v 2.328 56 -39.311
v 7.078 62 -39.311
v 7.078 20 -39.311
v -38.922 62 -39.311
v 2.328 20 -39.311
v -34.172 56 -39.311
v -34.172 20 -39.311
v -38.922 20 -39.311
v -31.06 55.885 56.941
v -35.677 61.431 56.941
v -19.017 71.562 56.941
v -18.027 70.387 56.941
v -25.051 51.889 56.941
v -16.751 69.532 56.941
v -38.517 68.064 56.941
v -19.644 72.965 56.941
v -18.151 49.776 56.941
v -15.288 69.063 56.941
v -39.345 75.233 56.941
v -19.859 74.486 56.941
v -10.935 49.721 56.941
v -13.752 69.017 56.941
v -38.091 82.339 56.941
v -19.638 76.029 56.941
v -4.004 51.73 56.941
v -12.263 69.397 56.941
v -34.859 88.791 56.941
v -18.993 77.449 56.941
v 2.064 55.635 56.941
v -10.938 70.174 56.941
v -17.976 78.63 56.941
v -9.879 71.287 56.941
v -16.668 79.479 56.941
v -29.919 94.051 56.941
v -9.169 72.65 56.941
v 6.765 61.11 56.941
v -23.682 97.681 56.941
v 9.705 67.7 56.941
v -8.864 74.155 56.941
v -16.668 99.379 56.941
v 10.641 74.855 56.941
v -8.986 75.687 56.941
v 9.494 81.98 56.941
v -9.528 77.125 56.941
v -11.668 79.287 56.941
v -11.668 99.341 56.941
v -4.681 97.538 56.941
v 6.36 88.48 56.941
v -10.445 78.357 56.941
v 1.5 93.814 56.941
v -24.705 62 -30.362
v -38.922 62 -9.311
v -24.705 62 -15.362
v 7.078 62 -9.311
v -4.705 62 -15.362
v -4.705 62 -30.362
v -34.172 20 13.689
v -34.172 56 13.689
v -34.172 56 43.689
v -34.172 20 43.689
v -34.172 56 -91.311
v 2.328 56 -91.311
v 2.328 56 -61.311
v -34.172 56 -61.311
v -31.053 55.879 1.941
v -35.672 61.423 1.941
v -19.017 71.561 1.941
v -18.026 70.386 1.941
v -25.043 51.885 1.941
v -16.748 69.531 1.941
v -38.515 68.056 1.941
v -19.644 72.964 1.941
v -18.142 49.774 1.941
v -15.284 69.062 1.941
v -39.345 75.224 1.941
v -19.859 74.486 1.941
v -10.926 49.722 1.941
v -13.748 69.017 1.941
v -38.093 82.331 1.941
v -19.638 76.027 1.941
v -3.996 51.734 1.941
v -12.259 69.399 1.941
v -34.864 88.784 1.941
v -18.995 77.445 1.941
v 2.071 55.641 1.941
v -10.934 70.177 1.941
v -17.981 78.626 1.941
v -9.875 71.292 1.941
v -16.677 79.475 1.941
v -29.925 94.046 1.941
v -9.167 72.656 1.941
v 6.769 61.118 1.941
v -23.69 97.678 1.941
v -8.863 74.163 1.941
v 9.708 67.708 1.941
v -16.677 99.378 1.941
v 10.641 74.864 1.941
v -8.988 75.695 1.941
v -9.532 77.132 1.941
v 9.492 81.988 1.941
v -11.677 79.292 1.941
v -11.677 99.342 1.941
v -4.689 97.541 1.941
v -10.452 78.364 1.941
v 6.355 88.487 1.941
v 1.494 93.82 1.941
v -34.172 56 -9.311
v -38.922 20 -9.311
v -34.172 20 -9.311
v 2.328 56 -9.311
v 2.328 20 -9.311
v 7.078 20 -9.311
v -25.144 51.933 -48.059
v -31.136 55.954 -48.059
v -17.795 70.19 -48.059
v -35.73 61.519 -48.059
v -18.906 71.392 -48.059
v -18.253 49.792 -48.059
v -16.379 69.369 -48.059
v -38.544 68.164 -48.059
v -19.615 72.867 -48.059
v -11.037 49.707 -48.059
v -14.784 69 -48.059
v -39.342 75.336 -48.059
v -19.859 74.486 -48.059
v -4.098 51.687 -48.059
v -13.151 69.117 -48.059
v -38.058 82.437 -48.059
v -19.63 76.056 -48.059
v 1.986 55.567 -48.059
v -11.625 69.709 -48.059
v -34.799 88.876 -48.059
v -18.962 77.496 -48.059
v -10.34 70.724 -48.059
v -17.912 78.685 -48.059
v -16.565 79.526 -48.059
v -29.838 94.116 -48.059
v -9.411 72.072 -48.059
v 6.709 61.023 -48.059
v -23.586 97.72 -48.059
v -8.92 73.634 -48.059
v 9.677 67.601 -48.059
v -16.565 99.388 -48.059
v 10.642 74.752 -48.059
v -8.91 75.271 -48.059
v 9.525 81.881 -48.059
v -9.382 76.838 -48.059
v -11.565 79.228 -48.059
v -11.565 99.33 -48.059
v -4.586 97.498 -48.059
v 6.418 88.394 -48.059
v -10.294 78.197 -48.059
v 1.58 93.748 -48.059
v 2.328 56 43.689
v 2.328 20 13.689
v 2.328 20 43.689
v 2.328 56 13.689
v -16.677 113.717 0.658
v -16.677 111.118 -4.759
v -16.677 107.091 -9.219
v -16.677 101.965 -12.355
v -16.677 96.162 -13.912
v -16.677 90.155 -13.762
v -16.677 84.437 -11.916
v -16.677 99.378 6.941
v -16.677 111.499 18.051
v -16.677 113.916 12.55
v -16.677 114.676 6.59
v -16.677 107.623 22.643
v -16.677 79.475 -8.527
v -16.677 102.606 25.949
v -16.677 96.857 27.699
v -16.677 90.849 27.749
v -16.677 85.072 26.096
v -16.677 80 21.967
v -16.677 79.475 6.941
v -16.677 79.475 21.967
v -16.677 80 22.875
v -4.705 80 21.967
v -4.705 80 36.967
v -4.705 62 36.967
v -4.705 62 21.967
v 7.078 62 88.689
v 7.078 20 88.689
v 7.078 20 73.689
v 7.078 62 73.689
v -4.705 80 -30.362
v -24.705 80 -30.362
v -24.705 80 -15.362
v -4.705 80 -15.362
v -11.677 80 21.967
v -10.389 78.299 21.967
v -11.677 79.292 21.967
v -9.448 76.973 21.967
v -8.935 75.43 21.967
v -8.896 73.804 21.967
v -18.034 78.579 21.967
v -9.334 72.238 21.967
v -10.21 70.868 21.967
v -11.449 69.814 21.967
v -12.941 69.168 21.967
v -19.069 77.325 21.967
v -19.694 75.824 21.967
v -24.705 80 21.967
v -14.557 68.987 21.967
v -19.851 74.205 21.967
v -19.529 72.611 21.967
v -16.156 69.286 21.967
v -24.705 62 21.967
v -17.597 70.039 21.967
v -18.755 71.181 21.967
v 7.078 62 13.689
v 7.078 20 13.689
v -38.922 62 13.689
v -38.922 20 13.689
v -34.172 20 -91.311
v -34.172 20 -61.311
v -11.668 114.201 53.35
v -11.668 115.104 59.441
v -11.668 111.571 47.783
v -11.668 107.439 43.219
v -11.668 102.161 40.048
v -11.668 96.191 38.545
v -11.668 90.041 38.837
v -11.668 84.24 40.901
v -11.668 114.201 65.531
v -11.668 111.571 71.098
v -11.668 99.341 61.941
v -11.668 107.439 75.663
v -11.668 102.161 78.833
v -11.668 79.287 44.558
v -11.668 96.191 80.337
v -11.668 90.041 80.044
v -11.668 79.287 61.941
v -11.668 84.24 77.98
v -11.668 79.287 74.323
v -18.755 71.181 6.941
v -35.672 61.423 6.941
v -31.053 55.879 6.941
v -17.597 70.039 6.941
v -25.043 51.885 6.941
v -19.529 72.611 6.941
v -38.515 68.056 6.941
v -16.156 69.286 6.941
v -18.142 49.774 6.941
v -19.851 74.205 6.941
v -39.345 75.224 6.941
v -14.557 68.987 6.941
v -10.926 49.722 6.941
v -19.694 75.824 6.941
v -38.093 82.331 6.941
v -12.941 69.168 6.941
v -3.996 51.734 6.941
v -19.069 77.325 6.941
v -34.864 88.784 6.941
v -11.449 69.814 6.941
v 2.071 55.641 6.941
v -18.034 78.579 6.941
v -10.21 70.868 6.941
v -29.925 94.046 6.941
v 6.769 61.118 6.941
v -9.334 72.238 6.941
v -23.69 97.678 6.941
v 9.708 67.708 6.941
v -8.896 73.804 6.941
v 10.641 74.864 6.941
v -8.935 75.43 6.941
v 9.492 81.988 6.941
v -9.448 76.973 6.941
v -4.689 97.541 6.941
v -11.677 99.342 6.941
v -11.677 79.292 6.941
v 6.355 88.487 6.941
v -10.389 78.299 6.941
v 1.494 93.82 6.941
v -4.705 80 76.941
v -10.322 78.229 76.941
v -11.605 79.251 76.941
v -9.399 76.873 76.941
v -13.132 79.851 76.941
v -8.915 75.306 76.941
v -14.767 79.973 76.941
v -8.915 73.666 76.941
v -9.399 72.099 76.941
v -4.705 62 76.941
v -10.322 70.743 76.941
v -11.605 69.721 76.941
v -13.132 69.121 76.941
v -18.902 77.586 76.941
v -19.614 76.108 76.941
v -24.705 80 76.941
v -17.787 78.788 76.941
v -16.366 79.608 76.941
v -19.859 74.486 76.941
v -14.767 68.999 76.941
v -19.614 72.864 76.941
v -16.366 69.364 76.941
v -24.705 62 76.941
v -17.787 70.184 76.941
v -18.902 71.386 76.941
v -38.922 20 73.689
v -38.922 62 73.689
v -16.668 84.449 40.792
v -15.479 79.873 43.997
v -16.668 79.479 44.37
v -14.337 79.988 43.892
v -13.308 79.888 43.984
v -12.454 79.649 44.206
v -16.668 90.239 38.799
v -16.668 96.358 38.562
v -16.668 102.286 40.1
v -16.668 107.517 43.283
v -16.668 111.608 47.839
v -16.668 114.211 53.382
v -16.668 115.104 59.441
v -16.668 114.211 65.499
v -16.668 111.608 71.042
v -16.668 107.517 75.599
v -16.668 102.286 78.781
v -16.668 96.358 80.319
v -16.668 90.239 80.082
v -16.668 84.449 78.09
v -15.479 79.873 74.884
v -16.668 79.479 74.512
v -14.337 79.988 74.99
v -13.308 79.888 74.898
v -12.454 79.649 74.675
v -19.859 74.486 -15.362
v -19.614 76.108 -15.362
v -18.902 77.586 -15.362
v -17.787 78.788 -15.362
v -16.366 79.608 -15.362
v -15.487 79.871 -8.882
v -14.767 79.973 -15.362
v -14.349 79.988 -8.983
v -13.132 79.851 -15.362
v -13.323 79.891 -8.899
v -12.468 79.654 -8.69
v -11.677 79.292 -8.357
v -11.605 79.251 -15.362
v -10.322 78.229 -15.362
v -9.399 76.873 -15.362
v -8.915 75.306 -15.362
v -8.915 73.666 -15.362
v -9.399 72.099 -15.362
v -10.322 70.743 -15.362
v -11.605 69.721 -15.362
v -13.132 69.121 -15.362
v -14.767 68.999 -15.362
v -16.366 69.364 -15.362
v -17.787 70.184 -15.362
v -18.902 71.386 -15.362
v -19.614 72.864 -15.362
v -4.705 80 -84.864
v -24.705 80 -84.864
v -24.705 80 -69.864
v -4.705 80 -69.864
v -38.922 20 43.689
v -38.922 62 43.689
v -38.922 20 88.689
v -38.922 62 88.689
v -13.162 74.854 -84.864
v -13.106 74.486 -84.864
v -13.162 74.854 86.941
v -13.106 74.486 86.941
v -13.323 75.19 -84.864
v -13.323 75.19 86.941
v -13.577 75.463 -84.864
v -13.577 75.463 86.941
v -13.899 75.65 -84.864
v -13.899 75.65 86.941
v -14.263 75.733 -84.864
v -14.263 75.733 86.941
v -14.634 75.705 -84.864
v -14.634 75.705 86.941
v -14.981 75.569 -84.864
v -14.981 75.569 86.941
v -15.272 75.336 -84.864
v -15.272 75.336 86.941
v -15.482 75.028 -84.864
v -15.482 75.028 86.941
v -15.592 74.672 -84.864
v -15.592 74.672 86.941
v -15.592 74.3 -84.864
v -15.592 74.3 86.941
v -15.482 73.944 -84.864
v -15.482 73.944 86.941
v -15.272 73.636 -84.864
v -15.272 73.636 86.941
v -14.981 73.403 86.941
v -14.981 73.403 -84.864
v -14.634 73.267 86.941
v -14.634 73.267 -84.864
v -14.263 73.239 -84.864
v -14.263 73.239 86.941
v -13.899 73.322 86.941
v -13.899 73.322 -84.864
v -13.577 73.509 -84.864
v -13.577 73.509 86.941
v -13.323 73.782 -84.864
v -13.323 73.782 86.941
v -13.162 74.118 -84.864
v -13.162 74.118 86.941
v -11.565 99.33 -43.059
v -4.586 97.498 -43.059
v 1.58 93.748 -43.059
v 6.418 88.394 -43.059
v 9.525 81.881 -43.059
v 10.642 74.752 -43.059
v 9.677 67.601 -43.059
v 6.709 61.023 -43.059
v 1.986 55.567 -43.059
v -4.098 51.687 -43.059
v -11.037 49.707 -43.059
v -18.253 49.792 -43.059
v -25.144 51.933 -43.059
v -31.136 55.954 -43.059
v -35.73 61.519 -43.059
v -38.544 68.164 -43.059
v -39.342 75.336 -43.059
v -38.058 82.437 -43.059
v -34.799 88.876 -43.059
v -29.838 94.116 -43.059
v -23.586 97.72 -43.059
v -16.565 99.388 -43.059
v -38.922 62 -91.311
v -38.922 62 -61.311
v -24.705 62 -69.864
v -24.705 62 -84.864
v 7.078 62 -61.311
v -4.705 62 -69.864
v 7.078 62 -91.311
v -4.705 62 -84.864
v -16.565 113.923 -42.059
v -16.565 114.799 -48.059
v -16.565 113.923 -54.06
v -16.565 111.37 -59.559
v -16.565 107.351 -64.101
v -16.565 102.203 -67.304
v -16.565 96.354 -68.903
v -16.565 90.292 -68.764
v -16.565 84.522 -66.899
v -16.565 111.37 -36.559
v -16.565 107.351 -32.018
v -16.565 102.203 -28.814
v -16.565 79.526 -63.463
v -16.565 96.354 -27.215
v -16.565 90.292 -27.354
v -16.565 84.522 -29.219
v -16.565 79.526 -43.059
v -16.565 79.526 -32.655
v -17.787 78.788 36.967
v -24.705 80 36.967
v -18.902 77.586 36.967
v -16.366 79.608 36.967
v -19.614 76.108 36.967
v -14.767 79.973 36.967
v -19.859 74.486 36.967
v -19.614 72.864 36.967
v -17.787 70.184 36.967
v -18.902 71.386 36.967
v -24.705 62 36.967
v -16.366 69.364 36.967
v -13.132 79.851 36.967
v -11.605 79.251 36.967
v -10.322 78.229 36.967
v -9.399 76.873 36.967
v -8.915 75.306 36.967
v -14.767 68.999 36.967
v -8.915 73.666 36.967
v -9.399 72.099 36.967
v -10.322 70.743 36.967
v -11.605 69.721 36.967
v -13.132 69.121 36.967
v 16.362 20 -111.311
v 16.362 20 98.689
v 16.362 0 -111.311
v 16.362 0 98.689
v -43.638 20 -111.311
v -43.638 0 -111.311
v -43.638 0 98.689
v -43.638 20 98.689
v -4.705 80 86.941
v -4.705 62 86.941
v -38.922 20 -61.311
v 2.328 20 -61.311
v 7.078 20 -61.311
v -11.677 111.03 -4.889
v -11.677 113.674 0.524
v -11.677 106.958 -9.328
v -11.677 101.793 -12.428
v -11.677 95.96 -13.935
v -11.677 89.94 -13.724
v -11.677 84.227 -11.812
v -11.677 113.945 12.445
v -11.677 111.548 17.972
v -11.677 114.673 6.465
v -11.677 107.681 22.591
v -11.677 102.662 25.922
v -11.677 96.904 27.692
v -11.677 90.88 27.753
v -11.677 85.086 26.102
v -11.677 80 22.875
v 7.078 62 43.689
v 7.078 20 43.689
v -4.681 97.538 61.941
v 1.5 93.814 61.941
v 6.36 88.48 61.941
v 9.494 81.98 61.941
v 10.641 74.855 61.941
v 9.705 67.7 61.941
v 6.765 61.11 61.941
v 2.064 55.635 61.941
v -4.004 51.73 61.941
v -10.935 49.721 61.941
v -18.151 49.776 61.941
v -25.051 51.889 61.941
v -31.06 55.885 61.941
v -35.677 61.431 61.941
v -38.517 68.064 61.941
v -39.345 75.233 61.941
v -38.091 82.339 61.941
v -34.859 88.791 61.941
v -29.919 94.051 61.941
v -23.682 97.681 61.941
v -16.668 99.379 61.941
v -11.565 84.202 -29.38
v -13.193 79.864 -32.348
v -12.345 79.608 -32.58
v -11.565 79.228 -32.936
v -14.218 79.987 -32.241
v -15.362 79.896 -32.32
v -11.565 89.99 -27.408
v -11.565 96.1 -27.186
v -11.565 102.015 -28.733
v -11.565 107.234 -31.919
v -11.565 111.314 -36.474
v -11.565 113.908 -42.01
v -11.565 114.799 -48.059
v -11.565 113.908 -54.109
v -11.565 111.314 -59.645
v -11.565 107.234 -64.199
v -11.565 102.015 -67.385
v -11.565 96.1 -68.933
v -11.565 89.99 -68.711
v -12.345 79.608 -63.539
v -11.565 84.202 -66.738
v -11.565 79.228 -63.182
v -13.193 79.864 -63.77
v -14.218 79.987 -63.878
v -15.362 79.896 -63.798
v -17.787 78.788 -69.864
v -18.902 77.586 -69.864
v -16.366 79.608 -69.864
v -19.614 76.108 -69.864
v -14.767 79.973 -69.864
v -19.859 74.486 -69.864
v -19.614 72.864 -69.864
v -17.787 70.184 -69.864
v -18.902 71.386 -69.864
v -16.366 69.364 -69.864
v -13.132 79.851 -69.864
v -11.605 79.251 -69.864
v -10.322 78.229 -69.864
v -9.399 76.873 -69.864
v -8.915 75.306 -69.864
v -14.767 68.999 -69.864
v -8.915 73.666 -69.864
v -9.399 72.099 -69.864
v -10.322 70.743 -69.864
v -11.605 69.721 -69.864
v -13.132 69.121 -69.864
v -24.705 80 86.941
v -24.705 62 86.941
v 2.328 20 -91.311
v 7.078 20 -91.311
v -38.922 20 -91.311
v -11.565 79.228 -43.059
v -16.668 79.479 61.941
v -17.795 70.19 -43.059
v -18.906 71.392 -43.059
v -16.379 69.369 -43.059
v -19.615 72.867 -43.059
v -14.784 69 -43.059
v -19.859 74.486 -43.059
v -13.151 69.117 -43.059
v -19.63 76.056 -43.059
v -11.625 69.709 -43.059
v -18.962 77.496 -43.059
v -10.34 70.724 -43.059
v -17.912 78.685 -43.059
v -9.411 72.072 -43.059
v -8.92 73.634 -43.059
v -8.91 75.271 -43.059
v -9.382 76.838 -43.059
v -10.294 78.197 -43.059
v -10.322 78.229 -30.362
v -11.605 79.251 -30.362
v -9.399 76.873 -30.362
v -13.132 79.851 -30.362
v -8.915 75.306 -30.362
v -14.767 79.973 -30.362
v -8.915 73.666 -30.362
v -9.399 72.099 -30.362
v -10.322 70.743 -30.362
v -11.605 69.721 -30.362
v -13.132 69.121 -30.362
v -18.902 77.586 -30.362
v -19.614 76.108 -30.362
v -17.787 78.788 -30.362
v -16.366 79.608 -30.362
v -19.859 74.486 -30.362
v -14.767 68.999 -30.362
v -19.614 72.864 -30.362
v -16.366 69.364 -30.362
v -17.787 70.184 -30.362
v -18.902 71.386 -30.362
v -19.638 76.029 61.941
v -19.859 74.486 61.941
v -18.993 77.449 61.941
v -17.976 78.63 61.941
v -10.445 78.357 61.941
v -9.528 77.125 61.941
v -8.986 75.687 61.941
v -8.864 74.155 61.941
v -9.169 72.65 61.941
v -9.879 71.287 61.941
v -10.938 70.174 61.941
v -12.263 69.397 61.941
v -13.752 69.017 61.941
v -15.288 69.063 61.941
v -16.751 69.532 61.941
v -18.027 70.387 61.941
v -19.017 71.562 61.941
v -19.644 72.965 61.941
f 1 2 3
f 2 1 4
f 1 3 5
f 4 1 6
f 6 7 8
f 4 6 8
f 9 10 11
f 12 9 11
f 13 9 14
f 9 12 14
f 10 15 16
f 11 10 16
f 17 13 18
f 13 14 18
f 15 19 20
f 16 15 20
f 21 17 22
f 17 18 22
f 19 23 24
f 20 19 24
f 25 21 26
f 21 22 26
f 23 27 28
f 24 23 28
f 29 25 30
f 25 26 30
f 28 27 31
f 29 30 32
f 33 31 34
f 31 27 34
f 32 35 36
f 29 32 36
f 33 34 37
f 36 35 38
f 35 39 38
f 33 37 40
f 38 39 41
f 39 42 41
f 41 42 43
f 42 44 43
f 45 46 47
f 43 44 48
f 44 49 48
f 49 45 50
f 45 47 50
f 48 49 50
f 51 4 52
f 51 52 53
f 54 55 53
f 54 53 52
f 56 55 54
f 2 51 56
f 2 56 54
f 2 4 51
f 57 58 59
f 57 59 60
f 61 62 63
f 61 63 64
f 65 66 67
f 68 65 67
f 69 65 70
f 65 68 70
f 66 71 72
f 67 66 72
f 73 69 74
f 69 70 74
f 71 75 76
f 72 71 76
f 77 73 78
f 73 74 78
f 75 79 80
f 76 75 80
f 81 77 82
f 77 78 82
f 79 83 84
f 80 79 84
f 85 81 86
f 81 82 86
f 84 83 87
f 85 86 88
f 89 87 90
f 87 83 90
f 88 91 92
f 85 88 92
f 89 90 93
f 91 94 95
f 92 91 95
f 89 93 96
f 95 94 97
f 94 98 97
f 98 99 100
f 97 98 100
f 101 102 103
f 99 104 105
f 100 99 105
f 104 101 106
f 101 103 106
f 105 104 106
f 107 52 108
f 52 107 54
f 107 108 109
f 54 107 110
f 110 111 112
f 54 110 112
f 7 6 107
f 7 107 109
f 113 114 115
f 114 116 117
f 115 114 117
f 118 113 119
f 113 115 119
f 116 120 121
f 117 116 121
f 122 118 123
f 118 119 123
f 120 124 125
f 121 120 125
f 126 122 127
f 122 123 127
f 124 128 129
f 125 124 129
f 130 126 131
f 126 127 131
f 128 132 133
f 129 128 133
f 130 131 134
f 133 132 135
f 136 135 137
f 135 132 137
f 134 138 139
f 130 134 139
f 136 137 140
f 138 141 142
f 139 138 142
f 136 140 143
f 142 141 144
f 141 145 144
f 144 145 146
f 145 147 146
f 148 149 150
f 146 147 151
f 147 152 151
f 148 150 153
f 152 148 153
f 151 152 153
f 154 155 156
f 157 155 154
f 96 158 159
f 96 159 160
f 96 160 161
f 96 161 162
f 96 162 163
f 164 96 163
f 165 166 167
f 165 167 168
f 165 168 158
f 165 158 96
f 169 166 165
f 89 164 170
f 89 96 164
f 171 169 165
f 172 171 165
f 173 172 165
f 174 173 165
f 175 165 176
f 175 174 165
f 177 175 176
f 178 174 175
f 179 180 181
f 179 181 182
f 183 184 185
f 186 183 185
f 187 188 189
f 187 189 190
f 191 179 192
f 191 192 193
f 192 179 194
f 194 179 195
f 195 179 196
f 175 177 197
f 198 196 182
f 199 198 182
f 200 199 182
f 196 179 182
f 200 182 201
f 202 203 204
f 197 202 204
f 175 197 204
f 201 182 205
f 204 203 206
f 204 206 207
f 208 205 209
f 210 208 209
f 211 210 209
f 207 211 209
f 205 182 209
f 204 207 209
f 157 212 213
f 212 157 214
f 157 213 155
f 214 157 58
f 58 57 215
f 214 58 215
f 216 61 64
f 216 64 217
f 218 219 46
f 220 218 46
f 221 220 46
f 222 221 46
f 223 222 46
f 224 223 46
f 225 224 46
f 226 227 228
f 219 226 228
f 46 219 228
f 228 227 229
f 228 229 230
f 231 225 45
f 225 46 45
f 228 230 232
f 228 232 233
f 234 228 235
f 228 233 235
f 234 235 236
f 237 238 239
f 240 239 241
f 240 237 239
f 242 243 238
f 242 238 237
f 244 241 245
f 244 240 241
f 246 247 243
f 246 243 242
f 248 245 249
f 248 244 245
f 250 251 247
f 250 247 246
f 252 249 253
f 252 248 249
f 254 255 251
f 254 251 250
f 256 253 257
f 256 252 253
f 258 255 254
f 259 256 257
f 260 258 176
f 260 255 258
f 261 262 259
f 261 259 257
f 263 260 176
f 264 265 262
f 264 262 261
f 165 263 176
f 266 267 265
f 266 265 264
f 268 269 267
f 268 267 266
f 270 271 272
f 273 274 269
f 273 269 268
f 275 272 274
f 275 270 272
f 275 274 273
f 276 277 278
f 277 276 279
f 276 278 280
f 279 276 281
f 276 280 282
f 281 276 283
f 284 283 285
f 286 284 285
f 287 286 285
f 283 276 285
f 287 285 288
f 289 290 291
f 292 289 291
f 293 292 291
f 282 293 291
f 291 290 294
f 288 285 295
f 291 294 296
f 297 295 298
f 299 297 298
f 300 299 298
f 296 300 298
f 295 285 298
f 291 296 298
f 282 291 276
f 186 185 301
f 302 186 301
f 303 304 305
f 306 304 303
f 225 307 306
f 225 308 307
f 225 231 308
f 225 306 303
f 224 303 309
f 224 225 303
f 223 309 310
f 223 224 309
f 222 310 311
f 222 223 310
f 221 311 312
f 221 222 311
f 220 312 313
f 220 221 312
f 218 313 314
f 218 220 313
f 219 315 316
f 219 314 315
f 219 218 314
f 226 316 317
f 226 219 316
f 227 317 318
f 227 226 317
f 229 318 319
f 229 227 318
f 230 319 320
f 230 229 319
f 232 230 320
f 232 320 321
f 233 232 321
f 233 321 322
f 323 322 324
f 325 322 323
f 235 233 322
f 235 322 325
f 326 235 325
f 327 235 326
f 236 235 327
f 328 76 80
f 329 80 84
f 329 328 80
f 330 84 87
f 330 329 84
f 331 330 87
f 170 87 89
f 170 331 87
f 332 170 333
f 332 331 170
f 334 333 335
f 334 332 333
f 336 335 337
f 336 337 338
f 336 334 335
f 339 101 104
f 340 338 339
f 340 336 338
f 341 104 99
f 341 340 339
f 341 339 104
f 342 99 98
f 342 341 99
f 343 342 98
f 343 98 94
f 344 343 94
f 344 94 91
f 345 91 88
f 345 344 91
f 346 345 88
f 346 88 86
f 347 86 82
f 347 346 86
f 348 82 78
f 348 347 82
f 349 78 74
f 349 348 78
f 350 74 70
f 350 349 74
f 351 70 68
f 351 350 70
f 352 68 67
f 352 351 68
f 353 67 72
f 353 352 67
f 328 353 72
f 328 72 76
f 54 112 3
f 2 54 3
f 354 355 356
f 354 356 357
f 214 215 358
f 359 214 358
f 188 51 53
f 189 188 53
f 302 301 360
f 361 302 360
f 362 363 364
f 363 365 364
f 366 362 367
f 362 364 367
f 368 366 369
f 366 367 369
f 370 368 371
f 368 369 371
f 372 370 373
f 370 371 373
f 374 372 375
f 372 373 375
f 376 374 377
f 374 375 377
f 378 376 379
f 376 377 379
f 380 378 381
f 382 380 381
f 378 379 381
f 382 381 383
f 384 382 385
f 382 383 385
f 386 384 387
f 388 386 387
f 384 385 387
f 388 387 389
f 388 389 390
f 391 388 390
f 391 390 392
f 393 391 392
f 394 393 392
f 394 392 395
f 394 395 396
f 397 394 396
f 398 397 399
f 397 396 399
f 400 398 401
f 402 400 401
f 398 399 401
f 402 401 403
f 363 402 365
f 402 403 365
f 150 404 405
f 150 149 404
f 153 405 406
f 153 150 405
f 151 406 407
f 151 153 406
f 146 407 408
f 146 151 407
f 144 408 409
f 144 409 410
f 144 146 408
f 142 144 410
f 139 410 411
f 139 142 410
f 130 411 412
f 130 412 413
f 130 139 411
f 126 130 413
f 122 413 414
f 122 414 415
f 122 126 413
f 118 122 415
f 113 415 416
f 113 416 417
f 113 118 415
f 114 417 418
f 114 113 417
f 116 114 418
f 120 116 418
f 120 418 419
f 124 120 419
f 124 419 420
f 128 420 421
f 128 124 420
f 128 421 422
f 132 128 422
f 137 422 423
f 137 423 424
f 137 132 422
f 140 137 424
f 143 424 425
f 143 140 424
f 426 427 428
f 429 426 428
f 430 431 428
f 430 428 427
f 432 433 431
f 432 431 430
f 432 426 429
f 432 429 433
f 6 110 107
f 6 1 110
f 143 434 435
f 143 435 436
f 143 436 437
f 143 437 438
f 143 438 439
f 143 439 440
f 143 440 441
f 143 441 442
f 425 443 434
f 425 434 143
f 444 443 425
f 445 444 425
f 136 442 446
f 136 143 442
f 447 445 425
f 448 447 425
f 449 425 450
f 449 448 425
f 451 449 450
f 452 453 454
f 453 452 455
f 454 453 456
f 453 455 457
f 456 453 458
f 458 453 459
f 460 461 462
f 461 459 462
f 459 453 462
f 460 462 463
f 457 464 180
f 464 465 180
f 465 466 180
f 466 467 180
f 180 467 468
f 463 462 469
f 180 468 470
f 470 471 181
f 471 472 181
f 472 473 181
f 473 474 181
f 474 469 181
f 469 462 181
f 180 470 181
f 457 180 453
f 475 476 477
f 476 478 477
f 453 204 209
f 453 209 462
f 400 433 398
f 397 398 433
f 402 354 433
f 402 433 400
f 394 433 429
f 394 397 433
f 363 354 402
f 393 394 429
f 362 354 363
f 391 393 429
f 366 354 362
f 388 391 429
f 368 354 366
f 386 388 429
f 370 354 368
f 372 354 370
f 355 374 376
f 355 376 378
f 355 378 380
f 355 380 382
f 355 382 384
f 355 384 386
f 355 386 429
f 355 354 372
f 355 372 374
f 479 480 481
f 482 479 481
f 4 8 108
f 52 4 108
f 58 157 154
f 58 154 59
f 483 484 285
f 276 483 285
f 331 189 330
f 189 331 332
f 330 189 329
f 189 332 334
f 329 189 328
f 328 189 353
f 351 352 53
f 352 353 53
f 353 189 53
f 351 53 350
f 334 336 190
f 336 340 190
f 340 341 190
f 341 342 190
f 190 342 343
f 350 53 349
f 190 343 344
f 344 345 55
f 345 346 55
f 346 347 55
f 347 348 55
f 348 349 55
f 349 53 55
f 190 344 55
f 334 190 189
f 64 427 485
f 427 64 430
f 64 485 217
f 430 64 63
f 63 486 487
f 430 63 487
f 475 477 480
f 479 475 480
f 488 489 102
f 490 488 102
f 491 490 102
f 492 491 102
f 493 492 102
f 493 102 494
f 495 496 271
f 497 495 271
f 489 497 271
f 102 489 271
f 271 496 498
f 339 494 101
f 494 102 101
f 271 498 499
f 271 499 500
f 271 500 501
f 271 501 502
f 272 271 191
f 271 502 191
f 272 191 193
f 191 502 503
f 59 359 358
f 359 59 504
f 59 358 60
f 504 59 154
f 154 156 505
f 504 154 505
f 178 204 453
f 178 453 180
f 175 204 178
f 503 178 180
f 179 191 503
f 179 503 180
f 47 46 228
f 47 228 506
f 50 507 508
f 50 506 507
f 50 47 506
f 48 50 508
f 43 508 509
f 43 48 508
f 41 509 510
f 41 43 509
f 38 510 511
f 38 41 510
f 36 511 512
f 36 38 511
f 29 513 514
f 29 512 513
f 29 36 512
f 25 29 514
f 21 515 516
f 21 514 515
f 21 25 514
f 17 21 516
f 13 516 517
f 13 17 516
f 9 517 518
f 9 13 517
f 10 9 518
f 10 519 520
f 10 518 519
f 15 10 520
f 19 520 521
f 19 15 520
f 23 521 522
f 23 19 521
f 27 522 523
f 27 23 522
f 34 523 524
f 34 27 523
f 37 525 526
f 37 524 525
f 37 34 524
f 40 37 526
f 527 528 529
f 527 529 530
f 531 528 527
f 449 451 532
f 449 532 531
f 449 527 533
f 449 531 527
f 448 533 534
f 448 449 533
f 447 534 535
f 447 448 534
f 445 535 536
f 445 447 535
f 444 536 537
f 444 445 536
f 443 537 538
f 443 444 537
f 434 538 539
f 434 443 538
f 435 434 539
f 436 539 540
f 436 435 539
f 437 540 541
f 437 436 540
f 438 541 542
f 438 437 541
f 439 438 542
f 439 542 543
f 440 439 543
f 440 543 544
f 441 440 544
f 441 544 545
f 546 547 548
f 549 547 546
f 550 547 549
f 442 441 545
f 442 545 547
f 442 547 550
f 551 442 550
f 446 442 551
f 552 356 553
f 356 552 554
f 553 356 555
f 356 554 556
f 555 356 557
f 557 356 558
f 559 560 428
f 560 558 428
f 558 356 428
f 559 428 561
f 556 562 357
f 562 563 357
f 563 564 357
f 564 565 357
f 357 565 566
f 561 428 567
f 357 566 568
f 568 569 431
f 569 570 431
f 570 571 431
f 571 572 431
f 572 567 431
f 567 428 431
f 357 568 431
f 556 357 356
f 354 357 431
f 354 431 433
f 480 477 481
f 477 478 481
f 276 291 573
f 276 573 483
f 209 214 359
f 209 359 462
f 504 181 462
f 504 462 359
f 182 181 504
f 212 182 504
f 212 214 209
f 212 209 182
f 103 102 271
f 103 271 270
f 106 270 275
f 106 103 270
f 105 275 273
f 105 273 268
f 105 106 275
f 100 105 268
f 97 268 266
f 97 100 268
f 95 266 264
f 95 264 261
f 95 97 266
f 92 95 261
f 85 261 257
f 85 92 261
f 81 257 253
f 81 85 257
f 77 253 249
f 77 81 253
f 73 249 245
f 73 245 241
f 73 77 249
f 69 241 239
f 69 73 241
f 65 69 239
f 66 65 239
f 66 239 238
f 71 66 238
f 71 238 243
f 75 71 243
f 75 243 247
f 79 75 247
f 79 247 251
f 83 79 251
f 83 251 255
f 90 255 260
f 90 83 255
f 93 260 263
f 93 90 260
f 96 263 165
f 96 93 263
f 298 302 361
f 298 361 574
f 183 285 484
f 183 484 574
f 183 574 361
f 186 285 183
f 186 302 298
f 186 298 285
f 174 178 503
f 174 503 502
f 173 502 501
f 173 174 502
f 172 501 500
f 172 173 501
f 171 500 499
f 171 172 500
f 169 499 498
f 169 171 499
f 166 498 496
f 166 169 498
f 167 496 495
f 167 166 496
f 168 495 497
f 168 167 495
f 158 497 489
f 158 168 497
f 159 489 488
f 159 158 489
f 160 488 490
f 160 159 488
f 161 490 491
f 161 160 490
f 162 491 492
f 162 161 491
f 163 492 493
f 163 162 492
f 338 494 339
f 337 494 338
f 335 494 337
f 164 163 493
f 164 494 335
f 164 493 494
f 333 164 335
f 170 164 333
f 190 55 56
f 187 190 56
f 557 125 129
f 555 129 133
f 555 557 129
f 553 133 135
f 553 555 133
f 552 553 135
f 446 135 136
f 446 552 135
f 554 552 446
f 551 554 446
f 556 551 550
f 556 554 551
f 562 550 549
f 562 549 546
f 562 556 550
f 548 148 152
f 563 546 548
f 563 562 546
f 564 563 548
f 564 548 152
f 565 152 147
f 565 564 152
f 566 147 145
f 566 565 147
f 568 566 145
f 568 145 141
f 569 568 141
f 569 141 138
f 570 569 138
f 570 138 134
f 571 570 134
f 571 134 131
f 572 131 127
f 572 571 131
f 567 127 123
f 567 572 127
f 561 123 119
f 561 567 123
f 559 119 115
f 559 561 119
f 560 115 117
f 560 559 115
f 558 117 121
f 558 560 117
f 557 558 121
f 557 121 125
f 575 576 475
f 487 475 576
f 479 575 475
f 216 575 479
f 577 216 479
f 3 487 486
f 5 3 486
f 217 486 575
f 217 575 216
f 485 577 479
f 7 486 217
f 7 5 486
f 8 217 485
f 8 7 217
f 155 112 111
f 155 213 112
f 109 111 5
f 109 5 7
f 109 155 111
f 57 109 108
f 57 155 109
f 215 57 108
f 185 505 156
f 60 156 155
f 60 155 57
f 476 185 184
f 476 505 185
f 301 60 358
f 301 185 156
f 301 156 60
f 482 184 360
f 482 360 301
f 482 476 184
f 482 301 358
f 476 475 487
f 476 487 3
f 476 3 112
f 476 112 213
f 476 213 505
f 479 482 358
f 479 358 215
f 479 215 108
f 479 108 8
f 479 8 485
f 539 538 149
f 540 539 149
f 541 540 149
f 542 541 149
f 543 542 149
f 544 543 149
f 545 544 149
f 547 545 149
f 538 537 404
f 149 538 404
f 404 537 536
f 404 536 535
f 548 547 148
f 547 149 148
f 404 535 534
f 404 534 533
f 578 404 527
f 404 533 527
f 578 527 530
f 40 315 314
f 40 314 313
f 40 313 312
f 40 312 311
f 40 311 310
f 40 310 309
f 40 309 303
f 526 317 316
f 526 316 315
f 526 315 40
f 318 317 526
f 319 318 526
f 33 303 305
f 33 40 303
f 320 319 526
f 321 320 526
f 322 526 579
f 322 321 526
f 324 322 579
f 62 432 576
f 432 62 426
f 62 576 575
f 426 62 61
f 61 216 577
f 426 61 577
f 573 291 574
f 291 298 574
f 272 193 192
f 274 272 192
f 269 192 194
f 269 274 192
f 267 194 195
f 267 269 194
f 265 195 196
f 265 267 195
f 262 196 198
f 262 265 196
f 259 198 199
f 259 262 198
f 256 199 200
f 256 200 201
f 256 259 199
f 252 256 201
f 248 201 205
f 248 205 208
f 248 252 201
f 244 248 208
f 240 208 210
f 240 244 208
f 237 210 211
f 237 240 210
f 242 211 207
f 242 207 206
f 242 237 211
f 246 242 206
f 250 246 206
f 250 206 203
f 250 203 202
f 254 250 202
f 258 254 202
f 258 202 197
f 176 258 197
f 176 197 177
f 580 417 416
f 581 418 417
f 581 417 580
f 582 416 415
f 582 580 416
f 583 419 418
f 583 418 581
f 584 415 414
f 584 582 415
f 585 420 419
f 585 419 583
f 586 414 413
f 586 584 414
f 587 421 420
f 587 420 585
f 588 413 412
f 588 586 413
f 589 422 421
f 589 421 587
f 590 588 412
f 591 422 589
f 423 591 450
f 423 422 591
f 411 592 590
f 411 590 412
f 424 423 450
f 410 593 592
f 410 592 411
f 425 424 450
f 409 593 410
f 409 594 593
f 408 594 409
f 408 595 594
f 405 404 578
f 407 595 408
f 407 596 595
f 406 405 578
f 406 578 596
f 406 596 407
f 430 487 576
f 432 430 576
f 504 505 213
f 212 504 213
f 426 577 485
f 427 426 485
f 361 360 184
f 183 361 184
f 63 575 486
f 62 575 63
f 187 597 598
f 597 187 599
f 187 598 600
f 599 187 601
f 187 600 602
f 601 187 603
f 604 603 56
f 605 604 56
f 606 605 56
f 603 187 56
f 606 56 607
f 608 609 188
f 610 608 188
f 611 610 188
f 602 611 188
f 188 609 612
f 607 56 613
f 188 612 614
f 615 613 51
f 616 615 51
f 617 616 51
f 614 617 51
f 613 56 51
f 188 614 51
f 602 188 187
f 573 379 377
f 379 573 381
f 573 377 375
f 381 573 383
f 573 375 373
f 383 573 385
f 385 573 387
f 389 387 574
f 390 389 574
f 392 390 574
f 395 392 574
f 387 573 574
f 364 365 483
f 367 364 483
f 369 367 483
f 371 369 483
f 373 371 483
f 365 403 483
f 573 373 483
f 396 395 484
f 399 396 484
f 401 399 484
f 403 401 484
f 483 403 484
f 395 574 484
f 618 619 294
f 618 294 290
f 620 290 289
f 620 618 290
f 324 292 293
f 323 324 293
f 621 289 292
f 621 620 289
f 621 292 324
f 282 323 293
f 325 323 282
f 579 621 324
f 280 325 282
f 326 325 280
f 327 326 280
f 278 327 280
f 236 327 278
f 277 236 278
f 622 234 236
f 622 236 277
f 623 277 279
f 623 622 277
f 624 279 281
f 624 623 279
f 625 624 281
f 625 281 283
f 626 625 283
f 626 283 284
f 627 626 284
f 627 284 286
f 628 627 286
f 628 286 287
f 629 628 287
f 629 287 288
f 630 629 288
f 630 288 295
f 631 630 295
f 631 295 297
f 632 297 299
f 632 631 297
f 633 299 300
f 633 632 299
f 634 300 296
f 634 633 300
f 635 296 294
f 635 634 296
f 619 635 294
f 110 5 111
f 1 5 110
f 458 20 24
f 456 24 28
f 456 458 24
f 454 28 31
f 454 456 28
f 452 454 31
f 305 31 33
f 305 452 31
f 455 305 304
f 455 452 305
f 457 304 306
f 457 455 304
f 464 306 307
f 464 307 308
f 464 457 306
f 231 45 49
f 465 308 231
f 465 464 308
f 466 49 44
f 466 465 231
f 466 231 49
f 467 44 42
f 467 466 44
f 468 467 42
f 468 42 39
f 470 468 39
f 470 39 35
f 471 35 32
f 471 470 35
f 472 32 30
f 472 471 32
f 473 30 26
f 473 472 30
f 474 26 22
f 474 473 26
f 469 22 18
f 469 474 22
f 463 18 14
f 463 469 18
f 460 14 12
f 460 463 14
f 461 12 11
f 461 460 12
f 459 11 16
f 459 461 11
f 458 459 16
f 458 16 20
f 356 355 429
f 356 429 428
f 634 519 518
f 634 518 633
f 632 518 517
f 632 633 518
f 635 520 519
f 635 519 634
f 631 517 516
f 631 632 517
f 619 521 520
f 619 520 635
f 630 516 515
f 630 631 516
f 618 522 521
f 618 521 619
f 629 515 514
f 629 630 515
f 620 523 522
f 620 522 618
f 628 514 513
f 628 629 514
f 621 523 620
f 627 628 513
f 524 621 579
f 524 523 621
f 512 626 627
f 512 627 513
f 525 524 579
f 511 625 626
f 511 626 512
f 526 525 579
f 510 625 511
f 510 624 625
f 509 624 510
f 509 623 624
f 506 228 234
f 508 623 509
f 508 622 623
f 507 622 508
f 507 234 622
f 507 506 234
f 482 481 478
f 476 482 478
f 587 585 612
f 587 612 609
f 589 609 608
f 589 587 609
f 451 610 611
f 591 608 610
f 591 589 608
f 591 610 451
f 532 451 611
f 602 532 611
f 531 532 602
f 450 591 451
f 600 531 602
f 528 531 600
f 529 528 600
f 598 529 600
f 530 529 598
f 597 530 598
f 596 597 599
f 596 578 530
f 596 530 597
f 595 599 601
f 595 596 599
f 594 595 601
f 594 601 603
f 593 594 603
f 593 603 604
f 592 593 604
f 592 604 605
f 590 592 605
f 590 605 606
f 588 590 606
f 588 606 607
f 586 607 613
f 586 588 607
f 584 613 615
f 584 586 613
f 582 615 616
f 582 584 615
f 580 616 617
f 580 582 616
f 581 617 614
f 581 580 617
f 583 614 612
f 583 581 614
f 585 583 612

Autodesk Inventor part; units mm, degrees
sketch "Boceto1" plane through (0, 0, 0) normal (0, 1, 0) x (-1, 0, 0)
  line L0 (43.6381, 98.6893) -> (-16.3619, 98.6893)
  line L1 (-16.3619, 98.6893) -> (-16.3619, -111.3107)
  line L2 (-16.3619, -111.3107) -> (43.6381, -111.3107)
  line L3 (43.6381, -111.3107) -> (43.6381, 98.6893)
  point P0 (0, 0)
  dimension "d0" = 210
  dimension "d1" = 60
extrude "Extrusión1" add sketch "Boceto1" along normal blind 20
sketch "Boceto2" plane through (0, 20, 0) normal (0, 1, 0) x (1, 0, 0)
  line L0 (-38.9219, -88.6893) -> (7.0781, -88.6893)
  line L1 (7.0781, -88.6893) -> (7.0781, -73.6893)
  line L2 (7.0781, -73.6893) -> (-38.9219, -73.6893)
  line L3 (-38.9219, -73.6893) -> (-38.9219, -88.6893)
  line L4 (-38.9219, -43.6893) -> (7.0781, -43.6893)
  line L5 (7.0781, -43.6893) -> (7.0781, -13.6893)
  line L6 (7.0781, -13.6893) -> (-38.9219, -13.6893)
  line L7 (-38.9219, -13.6893) -> (-38.9219, -43.6893)
  line L8 (-38.9219, 9.3107) -> (7.0781, 9.3107)
  line L9 (7.0781, 9.3107) -> (7.0781, 39.3107)
  line L10 (7.0781, 39.3107) -> (-38.9219, 39.3107)
  line L11 (-38.9219, 39.3107) -> (-38.9219, 9.3107)
  line L12 (-38.9219, 61.3107) -> (7.0781, 61.3107)
  line L13 (7.0781, 61.3107) -> (7.0781, 91.3107)
  line L14 (7.0781, 91.3107) -> (-38.9219, 91.3107)
  line L15 (-38.9219, 91.3107) -> (-38.9219, 61.3107)
  line L16 (-43.6381, -98.6893) -> (16.3619, -98.6893) projected
  line L17 (16.3619, 111.3107) -> (-43.6381, 111.3107) projected
  point P0 (0, 0)
  dimension "d6" = 15
  dimension "d7" = 30
  dimension "d8" = 46
  dimension "d9" = 46
  dimension "d10" = 30
  dimension "d11" = 46
  dimension "d12" = 30
  dimension "d13" = 46
  dimension "d14" = 10
  dimension "d15" = 20
  dimension "d16" = 30
  dimension "d17" = 23
  dimension "d18" = 22
extrude "Extrusión2" add sketch "Boceto2" along normal blind 42
sketch "Boceto3" plane through (0, 62, 0) normal (0, 1, 0) x (1, 0, 0)
  line L0 (-4.7048, -21.9668) -> (-24.7048, -21.9668)
  line L1 (-24.7048, -21.9668) -> (-24.7048, -36.9668)
  line L2 (-24.7048, -36.9668) -> (-4.7048, -36.9668)
  line L3 (-4.7048, -36.9668) -> (-4.7048, -21.9668)
  line L4 (-24.7048, 15.3623) -> (-4.7048, 15.3623)
  line L5 (-4.7048, 15.3623) -> (-4.7048, 30.3623)
  line L6 (-4.7048, 30.3623) -> (-24.7048, 30.3623)
  line L7 (-24.7048, 30.3623) -> (-24.7048, 15.3623)
  line L8 (-24.7048, 69.8642) -> (-4.7048, 69.8642)
  line L9 (-4.7048, 69.8642) -> (-4.7048, 84.8642)
  line L10 (-4.7048, 84.8642) -> (-24.7048, 84.8642)
  line L11 (-24.7048, 84.8642) -> (-24.7048, 69.8642)
  line L12 (-24.7048, -86.9407) -> (-4.7048, -86.9407)
  line L13 (-4.7048, -86.9407) -> (-4.7048, -76.9407)
  line L14 (-4.7048, -76.9407) -> (-24.7048, -76.9407)
  line L15 (-24.7048, -76.9407) -> (-24.7048, -86.9407)
  point P0 (0, 0)
  dimension "d19" = 20
  dimension "d20" = 15
  dimension "d21" = 20
  dimension "d22" = 15
  dimension "d23" = 15
  dimension "d24" = 20
  dimension "d25" = 20
  dimension "d26" = 10
  dimension "d31" = 0
extrude "Extrusión3" add sketch "Boceto3" along normal blind 18
sketch "Sketch16" plane through (7.0781, 20, -91.3107) normal (0, 0, -1) x (-1, 0, 0)
  line L0 (-9.2838, 0) -> (50.7162, 0) projected
  line L1 (4.75, 36) -> (41.25, 36)
  line L2 (41.25, 36) -> (41.25, 0)
  line L3 (41.25, 0) -> (4.75, 0)
  line L4 (4.75, 0) -> (4.75, 36)
  line L5 (0, 42) -> (46, 42) projected
  point P0 (7.0781, -20)
  point P1 (23, 42)
  point P2 (23, 36)
  point P3 (4.75, 0)
  dimension "d57" = 36.5
  dimension "d58" = 36
extrude "Extrusion8" cut sketch "Sketch16" against normal up to surface (135 mm away)
sketch "Boceto4" plane through (-4.7048, 62, -84.8642) normal (0, 0, -1) x (-1, 0, 0)
  circle A0 centre (9.6513, 12.486) radius 5.5025
  point P0 (-4.7048, -62)
extrude "Extrusión4" add sketch "Boceto4" against normal blind 170
ref_plane "Plano de trabajo1" through (-24.7048, 62, 56.9407) normal (0, 0, 1) x (1, 0, 0)
sketch "Boceto6" plane through (-24.7048, 62, 56.9407) normal (0, 0, 1) x (1, 0, 0)
  circle A0 centre (10.3487, 12.486) radius 5.5025 projected
  circle A1 centre (10.3487, 12.486) radius 25
  point P0 (24.7048, -62)
  point P1 (41.0667, -62)
  dimension "d33" = 74.486
  dimension "d34" = 25
extrude "Extrusión5" add sketch "Boceto6" along normal blind 5 contours A0 | A1
ref_plane "Plano de trabajo3" through (-24.7048, 62, 1.9407) normal (0, 0, 1) x (1, 0, 0)
ref_plane "Plano de trabajo4" through (-24.7048, 62, -48.0593) normal (0, 0, 1) x (1, 0, 0)
sketch "Boceto7" plane through (-24.7048, 62, 1.9407) normal (0, 0, 1) x (1, 0, 0)
  circle A0 centre (10.3487, 12.486) radius 25 projected
  circle A1 centre (10.3487, 12.486) radius 20
  point P0 (24.7048, -62)
extrude "Extrusión6" add sketch "Boceto7" along normal blind 5 contours A0 | A1
sketch "Boceto8" plane through (-24.7048, 62, -48.0593) normal (0, 0, 1) x (1, 0, 0)
  circle A0 centre (10.3487, 12.486) radius 25 projected
  circle A1 centre (10.3487, 12.486) radius 20
  point P0 (24.7048, -62)
  dimension "d48" = 50
extrude "Extrusión7" add sketch "Boceto8" along normal blind 5 contours A0 | A1
ref_plane "Plano de trabajo5" through (-14.3562, 74.486, 59.4407) normal (0, 0, -1) x (-1, 0, 0)
sketch "Boceto10" plane through (-14.3562, 74.486, 59.4407) normal (0, 0, -1) x (-1, 0, 0)
  line L0 (-2.688, 19.6173) -> (2.312, 19.6173)
  line L1 (2.312, 19.6173) -> (2.312, -1.3827)
  line L2 (2.312, -1.3827) -> (-2.688, -1.3827)
  line L3 (-2.688, -1.3827) -> (-2.688, 19.6173)
  line L4 (-30.7181, -74.486) -> (29.2819, -74.486) projected
  point P0 (-14.3562, -74.486)
  dimension "d43" = 21
  dimension "d46" = 5
revolve "Revolución1" add sketch "Boceto10" angle 360 about axis through (-11.6681, 94.1034, 59.4407) along (-1, 0, 0)
sketch "Boceto11" plane through (-14.3562, 74.486, 59.4407) normal (0, 0, -1) x (-1, 0, 0)
  point P0 (-14.3562, -74.486)
ref_plane "Plano de trabajo6" through (-22.9219, 20, 88.6893) normal (1, 0, 0) x (0, 0, -1)
sketch "Boceto14" plane through (-13.6381, 102.3503, 6.9407) normal (0, 0, 1) x (1, 0, 0)
  line L0 (-3.0387, -8.6715) -> (1.9613, -8.6715)
  line L1 (1.9613, -8.6715) -> (1.9613, -29.6715)
  line L2 (1.9613, -29.6715) -> (-3.0387, -29.6715)
  line L3 (-3.0387, -29.6715) -> (-3.0387, -8.6715)
  line L4 (-30.7181, -74.486) -> (29.2819, -74.486)
  point P0 (-14.3562, -74.486)
  dimension "d51" = 21
  dimension "d52" = 5
revolve "Revolución2" add sketch "Boceto14" angle 360 about axis through (-16.6768, 93.6788, 6.9407) along (-1, 0, 0)
sketch "Boceto15" plane through (-23.9868, 103.3042, -48.0593) normal (0, 0, 1) x (1, 0, 0)
  line L0 (7.4215, -9.5056) -> (12.4215, -9.5056)
  line L1 (12.4215, -9.5056) -> (12.4215, -30.5056)
  line L2 (12.4215, -30.5056) -> (7.4215, -30.5056)
  line L3 (7.4215, -30.5056) -> (7.4215, -9.5056)
  line L4 (-30.7181, -74.486) -> (29.2819, -74.486)
  point P0 (-14.3562, -74.486)
  dimension "d54" = 21
  dimension "d55" = 5
revolve "Revolución3" add sketch "Boceto15" angle 360 about axis through (-16.5652, 93.7986, -48.0593) along (-1, 0, 0)
sketch "Sketch17" plane through (-24.7048, 62, 86.9407) normal (0, 0, 1) x (1, 0, 0)
  circle A0 centre (10.3487, 12.486) radius 5.5025 projected
  circle A1 centre (10.3487, 12.486) radius 1.25
  point P0 (24.7048, -62)
  dimension "d61" = 2.5
extrude "Extrusion9" cut sketch "Sketch17" against normal up to next contours A1
